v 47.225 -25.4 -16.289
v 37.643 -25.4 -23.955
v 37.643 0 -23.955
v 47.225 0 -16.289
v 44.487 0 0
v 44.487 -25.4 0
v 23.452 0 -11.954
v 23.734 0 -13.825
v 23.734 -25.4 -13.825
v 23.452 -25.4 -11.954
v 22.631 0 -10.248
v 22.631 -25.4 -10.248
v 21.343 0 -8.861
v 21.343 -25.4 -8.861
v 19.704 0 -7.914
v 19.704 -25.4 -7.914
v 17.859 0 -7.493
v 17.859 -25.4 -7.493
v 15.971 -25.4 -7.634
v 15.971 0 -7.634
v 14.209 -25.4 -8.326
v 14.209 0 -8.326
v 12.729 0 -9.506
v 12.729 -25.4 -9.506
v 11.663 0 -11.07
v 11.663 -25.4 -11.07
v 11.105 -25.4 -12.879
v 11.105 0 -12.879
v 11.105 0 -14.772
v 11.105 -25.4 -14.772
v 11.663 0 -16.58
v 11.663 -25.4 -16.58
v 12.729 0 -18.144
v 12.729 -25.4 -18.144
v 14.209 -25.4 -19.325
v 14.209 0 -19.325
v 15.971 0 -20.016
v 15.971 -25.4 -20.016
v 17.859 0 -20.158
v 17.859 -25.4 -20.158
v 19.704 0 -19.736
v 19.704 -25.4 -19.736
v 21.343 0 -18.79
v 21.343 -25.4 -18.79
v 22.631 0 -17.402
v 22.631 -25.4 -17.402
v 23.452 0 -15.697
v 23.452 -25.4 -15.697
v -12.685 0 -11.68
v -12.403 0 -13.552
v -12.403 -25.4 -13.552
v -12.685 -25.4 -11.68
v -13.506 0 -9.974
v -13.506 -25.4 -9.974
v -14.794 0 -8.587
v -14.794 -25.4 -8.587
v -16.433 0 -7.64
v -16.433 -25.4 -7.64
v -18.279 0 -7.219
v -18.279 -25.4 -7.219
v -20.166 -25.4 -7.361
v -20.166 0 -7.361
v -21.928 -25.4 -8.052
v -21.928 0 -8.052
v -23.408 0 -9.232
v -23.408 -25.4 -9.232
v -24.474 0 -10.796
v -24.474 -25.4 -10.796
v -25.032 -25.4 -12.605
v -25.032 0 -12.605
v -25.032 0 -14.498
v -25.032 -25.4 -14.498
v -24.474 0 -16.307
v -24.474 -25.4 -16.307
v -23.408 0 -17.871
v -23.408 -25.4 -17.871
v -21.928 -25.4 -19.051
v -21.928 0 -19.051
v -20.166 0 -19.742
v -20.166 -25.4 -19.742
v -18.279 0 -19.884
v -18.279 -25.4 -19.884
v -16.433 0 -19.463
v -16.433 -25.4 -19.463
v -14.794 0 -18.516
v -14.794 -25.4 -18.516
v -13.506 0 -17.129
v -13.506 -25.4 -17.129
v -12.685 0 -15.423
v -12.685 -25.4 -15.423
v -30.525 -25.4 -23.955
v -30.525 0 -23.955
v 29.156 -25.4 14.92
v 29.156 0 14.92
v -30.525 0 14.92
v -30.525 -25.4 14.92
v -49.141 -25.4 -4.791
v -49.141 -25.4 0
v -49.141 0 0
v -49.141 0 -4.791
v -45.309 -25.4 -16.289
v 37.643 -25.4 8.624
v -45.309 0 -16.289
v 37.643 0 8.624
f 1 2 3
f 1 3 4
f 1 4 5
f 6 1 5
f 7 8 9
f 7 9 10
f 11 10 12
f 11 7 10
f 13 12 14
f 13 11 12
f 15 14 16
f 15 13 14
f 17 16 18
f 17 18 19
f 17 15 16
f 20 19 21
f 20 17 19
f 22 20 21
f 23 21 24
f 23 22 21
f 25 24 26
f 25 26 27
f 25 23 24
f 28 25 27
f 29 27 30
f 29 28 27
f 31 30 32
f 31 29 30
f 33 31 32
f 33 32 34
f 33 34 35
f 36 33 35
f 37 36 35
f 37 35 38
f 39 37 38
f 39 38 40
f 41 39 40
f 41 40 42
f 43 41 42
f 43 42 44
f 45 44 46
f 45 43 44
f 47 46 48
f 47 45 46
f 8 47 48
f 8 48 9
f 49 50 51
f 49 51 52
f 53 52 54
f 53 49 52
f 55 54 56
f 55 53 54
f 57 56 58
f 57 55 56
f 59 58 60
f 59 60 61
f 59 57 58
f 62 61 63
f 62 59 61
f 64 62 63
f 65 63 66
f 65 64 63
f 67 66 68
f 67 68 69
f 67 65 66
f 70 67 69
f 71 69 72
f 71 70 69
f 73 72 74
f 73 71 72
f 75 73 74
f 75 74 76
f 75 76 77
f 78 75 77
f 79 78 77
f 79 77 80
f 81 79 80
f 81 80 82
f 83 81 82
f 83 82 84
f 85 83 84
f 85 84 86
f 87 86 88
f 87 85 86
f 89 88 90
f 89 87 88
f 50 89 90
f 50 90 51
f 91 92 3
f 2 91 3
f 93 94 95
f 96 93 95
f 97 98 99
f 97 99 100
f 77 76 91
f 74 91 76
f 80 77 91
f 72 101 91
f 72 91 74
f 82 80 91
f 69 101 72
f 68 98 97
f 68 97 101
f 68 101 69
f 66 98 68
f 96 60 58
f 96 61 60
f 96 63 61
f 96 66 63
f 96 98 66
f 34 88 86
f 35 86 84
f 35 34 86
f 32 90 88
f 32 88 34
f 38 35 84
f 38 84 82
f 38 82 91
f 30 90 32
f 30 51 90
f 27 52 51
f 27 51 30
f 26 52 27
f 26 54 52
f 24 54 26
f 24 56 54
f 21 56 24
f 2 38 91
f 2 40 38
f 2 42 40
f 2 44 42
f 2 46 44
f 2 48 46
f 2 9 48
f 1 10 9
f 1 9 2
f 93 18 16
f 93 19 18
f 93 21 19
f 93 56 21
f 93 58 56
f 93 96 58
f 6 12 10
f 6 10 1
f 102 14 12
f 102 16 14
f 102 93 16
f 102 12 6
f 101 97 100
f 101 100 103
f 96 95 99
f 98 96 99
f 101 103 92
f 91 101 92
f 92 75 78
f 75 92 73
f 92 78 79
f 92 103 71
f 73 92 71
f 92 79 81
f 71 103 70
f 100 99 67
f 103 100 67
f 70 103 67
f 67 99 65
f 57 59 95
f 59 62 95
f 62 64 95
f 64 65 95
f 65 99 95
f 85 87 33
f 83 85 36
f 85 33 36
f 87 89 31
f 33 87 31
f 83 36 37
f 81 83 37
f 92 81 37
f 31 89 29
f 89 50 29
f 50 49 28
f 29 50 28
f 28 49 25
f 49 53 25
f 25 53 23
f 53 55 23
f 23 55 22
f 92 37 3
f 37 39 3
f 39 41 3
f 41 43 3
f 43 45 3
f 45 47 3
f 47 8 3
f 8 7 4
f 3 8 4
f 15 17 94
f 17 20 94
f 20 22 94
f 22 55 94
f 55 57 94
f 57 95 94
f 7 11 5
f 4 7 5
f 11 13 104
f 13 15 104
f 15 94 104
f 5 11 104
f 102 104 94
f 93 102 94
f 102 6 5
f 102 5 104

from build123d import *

# Parameters (mm, degrees)
F0_R     = 6.35
F1_DEPTH = 25.4


with BuildPart() as f1:
    # F0 (on Front) → F1 (new body)
    with BuildSketch(Plane.XZ):
        Polygon((29.156278, 14.92035), (-30.525118, 14.92035), (-49.141338, 0), (-49.141338, -4.790938), (-45.308587, -16.28919), (-30.525118, -23.95469), (37.643085, -23.95469), (47.224959, -16.28919), (44.487282, 0), (37.643085, 8.623689), align=None)
        with Locations((-18.753101, -13.551511)):
            Circle(F0_R, mode=Mode.SUBTRACT)
        with Locations((17.384261, -13.825279)):
            Circle(F0_R, mode=Mode.SUBTRACT)
    extrude(amount=F1_DEPTH)


solid = f1.part
